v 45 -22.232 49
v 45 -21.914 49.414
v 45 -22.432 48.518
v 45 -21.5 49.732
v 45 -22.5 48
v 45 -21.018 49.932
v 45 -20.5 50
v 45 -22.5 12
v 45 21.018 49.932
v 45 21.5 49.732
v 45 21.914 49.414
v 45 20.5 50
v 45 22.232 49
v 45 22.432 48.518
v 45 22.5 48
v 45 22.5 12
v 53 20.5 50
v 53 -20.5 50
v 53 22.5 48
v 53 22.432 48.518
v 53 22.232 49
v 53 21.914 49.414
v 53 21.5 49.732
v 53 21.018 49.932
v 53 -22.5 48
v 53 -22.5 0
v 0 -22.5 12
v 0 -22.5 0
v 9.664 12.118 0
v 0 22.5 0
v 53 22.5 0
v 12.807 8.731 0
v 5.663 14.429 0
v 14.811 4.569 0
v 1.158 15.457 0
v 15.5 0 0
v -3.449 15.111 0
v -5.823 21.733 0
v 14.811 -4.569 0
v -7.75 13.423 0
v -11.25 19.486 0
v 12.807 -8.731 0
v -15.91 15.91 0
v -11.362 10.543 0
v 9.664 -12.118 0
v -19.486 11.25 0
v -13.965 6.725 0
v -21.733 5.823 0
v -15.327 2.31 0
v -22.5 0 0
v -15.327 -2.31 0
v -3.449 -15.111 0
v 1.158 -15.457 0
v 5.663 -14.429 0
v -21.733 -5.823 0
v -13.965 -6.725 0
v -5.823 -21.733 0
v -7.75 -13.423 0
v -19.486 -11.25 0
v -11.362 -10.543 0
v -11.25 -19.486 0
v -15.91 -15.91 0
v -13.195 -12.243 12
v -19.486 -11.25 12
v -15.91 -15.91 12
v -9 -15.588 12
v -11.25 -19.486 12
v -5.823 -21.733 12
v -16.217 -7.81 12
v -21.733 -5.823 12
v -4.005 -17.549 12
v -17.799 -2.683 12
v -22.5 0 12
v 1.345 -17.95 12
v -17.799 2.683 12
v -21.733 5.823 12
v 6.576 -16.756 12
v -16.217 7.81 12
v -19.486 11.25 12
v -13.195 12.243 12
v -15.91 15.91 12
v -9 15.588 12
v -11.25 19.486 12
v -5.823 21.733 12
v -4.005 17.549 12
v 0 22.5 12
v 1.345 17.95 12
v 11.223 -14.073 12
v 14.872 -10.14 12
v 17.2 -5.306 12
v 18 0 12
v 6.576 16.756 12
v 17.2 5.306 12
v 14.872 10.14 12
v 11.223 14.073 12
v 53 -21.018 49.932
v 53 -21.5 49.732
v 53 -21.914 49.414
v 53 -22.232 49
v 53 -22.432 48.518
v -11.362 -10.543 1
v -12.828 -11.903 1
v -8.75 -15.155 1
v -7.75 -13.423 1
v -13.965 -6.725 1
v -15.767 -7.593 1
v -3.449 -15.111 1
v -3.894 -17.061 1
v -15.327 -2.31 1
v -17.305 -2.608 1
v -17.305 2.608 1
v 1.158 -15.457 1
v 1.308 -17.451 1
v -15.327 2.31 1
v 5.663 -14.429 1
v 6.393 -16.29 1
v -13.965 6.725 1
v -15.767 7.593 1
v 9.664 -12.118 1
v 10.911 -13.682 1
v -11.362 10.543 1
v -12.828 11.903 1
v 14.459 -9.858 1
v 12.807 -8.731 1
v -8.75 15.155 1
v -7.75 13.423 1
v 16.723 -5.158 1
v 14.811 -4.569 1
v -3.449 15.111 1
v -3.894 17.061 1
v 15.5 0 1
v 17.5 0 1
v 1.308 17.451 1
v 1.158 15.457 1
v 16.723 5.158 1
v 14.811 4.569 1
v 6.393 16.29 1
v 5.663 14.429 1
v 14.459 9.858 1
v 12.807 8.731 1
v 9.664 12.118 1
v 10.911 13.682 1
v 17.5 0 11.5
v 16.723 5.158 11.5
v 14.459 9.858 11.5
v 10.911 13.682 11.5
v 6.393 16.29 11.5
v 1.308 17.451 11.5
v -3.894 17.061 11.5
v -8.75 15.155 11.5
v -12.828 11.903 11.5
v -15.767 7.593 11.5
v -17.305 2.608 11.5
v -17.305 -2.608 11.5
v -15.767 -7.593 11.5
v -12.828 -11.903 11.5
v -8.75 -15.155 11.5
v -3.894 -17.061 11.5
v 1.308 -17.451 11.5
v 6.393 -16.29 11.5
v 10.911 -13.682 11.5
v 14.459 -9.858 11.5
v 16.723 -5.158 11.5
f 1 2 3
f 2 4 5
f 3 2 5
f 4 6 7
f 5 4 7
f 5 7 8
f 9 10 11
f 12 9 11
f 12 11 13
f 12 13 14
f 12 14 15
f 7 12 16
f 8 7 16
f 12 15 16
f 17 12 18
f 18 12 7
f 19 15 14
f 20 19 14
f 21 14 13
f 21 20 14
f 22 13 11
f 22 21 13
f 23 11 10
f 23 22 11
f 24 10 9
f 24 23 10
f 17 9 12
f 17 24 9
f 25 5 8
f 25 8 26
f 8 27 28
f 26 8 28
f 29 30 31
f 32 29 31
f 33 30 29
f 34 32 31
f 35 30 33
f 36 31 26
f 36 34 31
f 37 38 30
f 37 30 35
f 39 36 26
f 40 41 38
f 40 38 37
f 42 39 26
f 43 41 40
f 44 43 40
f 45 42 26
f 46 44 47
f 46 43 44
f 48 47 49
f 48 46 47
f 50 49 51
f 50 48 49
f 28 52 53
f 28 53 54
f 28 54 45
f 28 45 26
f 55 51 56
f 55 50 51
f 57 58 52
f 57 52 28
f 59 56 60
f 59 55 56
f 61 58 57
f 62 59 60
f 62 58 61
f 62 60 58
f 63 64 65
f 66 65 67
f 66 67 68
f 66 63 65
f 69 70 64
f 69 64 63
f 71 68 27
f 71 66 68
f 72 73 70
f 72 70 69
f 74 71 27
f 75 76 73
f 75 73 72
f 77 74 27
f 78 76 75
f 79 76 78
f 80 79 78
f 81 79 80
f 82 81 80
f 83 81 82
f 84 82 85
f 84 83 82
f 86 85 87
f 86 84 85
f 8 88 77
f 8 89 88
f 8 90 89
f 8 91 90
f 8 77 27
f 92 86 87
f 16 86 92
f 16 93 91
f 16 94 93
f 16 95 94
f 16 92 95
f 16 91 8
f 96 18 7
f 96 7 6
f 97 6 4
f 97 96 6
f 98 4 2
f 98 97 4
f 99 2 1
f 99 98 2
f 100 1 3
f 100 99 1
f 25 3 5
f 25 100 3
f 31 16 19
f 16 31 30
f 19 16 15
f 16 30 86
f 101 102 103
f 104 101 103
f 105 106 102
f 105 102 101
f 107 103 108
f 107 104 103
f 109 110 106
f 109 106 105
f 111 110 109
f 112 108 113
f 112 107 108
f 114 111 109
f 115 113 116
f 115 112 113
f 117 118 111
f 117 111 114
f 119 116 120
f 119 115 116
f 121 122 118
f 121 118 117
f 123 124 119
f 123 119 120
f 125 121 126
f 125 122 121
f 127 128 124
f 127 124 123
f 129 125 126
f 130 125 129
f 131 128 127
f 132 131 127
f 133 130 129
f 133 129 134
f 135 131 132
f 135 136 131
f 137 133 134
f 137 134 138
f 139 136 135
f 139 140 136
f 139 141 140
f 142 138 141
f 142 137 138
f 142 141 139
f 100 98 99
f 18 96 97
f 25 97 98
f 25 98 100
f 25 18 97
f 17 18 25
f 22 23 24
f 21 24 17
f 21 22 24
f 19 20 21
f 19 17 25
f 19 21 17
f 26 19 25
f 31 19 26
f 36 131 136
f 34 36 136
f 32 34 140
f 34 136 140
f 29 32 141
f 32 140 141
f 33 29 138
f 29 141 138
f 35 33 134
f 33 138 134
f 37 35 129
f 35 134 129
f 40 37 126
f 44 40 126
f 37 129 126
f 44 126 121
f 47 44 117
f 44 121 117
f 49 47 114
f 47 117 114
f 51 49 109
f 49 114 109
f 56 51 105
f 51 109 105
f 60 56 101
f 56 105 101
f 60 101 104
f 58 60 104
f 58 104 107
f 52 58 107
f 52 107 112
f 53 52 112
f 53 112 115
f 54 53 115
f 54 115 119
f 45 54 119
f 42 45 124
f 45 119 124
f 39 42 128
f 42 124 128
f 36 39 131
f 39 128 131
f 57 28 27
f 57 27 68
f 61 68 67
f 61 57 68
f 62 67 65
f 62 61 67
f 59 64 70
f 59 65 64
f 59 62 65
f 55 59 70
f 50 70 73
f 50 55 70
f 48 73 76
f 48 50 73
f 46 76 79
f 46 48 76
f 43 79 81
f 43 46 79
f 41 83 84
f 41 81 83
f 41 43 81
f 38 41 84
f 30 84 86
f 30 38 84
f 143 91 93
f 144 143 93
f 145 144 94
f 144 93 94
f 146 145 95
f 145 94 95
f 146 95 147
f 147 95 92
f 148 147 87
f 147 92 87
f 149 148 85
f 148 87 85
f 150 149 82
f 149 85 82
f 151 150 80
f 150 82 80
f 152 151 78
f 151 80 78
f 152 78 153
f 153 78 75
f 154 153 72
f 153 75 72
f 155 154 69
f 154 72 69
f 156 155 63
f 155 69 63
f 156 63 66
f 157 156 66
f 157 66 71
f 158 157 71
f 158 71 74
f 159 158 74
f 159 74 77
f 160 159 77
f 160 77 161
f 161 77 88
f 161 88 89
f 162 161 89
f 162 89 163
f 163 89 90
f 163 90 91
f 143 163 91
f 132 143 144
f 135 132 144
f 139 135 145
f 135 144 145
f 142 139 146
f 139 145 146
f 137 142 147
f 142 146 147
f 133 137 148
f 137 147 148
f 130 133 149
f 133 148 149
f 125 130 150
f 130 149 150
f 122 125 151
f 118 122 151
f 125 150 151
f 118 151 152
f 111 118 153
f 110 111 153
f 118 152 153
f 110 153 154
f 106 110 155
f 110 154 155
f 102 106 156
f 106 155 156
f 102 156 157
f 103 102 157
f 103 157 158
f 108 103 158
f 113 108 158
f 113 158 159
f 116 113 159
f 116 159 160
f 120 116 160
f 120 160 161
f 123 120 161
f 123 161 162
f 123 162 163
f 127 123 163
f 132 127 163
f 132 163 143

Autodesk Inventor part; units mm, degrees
ref_plane "YZ Plane" through (0, 0, 0) normal (1, 0, 0) x (0, 1, 0)
ref_plane "XZ Plane" through (0, 0, 0) normal (0, 1, 0) x (-1, 0, 0)
ref_plane "XY Plane" through (0, 0, 0) normal (0, 0, 1) x (1, 0, 0)
sketch "Schizzo1" plane through (0, 0, 0) normal (0, 0, 1) x (1, 0, 0)
  arc A0 (0, 22.5) -> (0, -22.5) centre (0, 0) ccw
  line L0 (0, 22.5) -> (45, 22.5)
  line L1 (45, 22.5) -> (45, -22.5)
  line L2 (45, -22.5) -> (0, -22.5)
  dimension "d1" = 45
  dimension "d2" = 45
extrude "Estrusione1" add sketch "Schizzo1" along normal blind 12
sketch "Schizzo2" plane through (0, 0, 12) normal (0, 0, 1) x (1, 0, 0)
  circle A0 centre (0, 0) radius 17.5
  dimension "d5" = 35
extrude "Estrusione2" cut sketch "Schizzo2" against normal blind 11
sketch "Schizzo3" plane through (0, 0, 1) normal (0, 0, 1) x (1, 0, 0)
  circle A0 centre (0, 0) radius 15.5
  dimension "d8" = 31
extrude "Estrusione3" cut sketch "Schizzo3" against normal up to next
chamfer "Smusso1" distance 0.5 angle 45 1 edges at (-17.5, 0, 12)
sketch "Schizzo4" plane through (45, -22.5, 0) normal (1, 0, 0) x (0, 0, -1)
  line L0 (0, 45) -> (0, 0) projected
  line L1 (0, 45) -> (-50, 45)
  line L2 (-50, 45) -> (-50, 0)
  line L3 (-50, 0) -> (0, 0)
  line L4 (0, 0) -> (0, 45)
  point P0 (0, 22.5)
  dimension "d15" = 50
  dimension "d16" = 45
extrude "Estrusione4" add sketch "Schizzo4" along normal blind 8
fillet "Raccordo2" radius 2 2 edges at (49, 22.5, 50) (49, -22.5, 50)
properties part number "Porta cuscinetto perno telaietto"
